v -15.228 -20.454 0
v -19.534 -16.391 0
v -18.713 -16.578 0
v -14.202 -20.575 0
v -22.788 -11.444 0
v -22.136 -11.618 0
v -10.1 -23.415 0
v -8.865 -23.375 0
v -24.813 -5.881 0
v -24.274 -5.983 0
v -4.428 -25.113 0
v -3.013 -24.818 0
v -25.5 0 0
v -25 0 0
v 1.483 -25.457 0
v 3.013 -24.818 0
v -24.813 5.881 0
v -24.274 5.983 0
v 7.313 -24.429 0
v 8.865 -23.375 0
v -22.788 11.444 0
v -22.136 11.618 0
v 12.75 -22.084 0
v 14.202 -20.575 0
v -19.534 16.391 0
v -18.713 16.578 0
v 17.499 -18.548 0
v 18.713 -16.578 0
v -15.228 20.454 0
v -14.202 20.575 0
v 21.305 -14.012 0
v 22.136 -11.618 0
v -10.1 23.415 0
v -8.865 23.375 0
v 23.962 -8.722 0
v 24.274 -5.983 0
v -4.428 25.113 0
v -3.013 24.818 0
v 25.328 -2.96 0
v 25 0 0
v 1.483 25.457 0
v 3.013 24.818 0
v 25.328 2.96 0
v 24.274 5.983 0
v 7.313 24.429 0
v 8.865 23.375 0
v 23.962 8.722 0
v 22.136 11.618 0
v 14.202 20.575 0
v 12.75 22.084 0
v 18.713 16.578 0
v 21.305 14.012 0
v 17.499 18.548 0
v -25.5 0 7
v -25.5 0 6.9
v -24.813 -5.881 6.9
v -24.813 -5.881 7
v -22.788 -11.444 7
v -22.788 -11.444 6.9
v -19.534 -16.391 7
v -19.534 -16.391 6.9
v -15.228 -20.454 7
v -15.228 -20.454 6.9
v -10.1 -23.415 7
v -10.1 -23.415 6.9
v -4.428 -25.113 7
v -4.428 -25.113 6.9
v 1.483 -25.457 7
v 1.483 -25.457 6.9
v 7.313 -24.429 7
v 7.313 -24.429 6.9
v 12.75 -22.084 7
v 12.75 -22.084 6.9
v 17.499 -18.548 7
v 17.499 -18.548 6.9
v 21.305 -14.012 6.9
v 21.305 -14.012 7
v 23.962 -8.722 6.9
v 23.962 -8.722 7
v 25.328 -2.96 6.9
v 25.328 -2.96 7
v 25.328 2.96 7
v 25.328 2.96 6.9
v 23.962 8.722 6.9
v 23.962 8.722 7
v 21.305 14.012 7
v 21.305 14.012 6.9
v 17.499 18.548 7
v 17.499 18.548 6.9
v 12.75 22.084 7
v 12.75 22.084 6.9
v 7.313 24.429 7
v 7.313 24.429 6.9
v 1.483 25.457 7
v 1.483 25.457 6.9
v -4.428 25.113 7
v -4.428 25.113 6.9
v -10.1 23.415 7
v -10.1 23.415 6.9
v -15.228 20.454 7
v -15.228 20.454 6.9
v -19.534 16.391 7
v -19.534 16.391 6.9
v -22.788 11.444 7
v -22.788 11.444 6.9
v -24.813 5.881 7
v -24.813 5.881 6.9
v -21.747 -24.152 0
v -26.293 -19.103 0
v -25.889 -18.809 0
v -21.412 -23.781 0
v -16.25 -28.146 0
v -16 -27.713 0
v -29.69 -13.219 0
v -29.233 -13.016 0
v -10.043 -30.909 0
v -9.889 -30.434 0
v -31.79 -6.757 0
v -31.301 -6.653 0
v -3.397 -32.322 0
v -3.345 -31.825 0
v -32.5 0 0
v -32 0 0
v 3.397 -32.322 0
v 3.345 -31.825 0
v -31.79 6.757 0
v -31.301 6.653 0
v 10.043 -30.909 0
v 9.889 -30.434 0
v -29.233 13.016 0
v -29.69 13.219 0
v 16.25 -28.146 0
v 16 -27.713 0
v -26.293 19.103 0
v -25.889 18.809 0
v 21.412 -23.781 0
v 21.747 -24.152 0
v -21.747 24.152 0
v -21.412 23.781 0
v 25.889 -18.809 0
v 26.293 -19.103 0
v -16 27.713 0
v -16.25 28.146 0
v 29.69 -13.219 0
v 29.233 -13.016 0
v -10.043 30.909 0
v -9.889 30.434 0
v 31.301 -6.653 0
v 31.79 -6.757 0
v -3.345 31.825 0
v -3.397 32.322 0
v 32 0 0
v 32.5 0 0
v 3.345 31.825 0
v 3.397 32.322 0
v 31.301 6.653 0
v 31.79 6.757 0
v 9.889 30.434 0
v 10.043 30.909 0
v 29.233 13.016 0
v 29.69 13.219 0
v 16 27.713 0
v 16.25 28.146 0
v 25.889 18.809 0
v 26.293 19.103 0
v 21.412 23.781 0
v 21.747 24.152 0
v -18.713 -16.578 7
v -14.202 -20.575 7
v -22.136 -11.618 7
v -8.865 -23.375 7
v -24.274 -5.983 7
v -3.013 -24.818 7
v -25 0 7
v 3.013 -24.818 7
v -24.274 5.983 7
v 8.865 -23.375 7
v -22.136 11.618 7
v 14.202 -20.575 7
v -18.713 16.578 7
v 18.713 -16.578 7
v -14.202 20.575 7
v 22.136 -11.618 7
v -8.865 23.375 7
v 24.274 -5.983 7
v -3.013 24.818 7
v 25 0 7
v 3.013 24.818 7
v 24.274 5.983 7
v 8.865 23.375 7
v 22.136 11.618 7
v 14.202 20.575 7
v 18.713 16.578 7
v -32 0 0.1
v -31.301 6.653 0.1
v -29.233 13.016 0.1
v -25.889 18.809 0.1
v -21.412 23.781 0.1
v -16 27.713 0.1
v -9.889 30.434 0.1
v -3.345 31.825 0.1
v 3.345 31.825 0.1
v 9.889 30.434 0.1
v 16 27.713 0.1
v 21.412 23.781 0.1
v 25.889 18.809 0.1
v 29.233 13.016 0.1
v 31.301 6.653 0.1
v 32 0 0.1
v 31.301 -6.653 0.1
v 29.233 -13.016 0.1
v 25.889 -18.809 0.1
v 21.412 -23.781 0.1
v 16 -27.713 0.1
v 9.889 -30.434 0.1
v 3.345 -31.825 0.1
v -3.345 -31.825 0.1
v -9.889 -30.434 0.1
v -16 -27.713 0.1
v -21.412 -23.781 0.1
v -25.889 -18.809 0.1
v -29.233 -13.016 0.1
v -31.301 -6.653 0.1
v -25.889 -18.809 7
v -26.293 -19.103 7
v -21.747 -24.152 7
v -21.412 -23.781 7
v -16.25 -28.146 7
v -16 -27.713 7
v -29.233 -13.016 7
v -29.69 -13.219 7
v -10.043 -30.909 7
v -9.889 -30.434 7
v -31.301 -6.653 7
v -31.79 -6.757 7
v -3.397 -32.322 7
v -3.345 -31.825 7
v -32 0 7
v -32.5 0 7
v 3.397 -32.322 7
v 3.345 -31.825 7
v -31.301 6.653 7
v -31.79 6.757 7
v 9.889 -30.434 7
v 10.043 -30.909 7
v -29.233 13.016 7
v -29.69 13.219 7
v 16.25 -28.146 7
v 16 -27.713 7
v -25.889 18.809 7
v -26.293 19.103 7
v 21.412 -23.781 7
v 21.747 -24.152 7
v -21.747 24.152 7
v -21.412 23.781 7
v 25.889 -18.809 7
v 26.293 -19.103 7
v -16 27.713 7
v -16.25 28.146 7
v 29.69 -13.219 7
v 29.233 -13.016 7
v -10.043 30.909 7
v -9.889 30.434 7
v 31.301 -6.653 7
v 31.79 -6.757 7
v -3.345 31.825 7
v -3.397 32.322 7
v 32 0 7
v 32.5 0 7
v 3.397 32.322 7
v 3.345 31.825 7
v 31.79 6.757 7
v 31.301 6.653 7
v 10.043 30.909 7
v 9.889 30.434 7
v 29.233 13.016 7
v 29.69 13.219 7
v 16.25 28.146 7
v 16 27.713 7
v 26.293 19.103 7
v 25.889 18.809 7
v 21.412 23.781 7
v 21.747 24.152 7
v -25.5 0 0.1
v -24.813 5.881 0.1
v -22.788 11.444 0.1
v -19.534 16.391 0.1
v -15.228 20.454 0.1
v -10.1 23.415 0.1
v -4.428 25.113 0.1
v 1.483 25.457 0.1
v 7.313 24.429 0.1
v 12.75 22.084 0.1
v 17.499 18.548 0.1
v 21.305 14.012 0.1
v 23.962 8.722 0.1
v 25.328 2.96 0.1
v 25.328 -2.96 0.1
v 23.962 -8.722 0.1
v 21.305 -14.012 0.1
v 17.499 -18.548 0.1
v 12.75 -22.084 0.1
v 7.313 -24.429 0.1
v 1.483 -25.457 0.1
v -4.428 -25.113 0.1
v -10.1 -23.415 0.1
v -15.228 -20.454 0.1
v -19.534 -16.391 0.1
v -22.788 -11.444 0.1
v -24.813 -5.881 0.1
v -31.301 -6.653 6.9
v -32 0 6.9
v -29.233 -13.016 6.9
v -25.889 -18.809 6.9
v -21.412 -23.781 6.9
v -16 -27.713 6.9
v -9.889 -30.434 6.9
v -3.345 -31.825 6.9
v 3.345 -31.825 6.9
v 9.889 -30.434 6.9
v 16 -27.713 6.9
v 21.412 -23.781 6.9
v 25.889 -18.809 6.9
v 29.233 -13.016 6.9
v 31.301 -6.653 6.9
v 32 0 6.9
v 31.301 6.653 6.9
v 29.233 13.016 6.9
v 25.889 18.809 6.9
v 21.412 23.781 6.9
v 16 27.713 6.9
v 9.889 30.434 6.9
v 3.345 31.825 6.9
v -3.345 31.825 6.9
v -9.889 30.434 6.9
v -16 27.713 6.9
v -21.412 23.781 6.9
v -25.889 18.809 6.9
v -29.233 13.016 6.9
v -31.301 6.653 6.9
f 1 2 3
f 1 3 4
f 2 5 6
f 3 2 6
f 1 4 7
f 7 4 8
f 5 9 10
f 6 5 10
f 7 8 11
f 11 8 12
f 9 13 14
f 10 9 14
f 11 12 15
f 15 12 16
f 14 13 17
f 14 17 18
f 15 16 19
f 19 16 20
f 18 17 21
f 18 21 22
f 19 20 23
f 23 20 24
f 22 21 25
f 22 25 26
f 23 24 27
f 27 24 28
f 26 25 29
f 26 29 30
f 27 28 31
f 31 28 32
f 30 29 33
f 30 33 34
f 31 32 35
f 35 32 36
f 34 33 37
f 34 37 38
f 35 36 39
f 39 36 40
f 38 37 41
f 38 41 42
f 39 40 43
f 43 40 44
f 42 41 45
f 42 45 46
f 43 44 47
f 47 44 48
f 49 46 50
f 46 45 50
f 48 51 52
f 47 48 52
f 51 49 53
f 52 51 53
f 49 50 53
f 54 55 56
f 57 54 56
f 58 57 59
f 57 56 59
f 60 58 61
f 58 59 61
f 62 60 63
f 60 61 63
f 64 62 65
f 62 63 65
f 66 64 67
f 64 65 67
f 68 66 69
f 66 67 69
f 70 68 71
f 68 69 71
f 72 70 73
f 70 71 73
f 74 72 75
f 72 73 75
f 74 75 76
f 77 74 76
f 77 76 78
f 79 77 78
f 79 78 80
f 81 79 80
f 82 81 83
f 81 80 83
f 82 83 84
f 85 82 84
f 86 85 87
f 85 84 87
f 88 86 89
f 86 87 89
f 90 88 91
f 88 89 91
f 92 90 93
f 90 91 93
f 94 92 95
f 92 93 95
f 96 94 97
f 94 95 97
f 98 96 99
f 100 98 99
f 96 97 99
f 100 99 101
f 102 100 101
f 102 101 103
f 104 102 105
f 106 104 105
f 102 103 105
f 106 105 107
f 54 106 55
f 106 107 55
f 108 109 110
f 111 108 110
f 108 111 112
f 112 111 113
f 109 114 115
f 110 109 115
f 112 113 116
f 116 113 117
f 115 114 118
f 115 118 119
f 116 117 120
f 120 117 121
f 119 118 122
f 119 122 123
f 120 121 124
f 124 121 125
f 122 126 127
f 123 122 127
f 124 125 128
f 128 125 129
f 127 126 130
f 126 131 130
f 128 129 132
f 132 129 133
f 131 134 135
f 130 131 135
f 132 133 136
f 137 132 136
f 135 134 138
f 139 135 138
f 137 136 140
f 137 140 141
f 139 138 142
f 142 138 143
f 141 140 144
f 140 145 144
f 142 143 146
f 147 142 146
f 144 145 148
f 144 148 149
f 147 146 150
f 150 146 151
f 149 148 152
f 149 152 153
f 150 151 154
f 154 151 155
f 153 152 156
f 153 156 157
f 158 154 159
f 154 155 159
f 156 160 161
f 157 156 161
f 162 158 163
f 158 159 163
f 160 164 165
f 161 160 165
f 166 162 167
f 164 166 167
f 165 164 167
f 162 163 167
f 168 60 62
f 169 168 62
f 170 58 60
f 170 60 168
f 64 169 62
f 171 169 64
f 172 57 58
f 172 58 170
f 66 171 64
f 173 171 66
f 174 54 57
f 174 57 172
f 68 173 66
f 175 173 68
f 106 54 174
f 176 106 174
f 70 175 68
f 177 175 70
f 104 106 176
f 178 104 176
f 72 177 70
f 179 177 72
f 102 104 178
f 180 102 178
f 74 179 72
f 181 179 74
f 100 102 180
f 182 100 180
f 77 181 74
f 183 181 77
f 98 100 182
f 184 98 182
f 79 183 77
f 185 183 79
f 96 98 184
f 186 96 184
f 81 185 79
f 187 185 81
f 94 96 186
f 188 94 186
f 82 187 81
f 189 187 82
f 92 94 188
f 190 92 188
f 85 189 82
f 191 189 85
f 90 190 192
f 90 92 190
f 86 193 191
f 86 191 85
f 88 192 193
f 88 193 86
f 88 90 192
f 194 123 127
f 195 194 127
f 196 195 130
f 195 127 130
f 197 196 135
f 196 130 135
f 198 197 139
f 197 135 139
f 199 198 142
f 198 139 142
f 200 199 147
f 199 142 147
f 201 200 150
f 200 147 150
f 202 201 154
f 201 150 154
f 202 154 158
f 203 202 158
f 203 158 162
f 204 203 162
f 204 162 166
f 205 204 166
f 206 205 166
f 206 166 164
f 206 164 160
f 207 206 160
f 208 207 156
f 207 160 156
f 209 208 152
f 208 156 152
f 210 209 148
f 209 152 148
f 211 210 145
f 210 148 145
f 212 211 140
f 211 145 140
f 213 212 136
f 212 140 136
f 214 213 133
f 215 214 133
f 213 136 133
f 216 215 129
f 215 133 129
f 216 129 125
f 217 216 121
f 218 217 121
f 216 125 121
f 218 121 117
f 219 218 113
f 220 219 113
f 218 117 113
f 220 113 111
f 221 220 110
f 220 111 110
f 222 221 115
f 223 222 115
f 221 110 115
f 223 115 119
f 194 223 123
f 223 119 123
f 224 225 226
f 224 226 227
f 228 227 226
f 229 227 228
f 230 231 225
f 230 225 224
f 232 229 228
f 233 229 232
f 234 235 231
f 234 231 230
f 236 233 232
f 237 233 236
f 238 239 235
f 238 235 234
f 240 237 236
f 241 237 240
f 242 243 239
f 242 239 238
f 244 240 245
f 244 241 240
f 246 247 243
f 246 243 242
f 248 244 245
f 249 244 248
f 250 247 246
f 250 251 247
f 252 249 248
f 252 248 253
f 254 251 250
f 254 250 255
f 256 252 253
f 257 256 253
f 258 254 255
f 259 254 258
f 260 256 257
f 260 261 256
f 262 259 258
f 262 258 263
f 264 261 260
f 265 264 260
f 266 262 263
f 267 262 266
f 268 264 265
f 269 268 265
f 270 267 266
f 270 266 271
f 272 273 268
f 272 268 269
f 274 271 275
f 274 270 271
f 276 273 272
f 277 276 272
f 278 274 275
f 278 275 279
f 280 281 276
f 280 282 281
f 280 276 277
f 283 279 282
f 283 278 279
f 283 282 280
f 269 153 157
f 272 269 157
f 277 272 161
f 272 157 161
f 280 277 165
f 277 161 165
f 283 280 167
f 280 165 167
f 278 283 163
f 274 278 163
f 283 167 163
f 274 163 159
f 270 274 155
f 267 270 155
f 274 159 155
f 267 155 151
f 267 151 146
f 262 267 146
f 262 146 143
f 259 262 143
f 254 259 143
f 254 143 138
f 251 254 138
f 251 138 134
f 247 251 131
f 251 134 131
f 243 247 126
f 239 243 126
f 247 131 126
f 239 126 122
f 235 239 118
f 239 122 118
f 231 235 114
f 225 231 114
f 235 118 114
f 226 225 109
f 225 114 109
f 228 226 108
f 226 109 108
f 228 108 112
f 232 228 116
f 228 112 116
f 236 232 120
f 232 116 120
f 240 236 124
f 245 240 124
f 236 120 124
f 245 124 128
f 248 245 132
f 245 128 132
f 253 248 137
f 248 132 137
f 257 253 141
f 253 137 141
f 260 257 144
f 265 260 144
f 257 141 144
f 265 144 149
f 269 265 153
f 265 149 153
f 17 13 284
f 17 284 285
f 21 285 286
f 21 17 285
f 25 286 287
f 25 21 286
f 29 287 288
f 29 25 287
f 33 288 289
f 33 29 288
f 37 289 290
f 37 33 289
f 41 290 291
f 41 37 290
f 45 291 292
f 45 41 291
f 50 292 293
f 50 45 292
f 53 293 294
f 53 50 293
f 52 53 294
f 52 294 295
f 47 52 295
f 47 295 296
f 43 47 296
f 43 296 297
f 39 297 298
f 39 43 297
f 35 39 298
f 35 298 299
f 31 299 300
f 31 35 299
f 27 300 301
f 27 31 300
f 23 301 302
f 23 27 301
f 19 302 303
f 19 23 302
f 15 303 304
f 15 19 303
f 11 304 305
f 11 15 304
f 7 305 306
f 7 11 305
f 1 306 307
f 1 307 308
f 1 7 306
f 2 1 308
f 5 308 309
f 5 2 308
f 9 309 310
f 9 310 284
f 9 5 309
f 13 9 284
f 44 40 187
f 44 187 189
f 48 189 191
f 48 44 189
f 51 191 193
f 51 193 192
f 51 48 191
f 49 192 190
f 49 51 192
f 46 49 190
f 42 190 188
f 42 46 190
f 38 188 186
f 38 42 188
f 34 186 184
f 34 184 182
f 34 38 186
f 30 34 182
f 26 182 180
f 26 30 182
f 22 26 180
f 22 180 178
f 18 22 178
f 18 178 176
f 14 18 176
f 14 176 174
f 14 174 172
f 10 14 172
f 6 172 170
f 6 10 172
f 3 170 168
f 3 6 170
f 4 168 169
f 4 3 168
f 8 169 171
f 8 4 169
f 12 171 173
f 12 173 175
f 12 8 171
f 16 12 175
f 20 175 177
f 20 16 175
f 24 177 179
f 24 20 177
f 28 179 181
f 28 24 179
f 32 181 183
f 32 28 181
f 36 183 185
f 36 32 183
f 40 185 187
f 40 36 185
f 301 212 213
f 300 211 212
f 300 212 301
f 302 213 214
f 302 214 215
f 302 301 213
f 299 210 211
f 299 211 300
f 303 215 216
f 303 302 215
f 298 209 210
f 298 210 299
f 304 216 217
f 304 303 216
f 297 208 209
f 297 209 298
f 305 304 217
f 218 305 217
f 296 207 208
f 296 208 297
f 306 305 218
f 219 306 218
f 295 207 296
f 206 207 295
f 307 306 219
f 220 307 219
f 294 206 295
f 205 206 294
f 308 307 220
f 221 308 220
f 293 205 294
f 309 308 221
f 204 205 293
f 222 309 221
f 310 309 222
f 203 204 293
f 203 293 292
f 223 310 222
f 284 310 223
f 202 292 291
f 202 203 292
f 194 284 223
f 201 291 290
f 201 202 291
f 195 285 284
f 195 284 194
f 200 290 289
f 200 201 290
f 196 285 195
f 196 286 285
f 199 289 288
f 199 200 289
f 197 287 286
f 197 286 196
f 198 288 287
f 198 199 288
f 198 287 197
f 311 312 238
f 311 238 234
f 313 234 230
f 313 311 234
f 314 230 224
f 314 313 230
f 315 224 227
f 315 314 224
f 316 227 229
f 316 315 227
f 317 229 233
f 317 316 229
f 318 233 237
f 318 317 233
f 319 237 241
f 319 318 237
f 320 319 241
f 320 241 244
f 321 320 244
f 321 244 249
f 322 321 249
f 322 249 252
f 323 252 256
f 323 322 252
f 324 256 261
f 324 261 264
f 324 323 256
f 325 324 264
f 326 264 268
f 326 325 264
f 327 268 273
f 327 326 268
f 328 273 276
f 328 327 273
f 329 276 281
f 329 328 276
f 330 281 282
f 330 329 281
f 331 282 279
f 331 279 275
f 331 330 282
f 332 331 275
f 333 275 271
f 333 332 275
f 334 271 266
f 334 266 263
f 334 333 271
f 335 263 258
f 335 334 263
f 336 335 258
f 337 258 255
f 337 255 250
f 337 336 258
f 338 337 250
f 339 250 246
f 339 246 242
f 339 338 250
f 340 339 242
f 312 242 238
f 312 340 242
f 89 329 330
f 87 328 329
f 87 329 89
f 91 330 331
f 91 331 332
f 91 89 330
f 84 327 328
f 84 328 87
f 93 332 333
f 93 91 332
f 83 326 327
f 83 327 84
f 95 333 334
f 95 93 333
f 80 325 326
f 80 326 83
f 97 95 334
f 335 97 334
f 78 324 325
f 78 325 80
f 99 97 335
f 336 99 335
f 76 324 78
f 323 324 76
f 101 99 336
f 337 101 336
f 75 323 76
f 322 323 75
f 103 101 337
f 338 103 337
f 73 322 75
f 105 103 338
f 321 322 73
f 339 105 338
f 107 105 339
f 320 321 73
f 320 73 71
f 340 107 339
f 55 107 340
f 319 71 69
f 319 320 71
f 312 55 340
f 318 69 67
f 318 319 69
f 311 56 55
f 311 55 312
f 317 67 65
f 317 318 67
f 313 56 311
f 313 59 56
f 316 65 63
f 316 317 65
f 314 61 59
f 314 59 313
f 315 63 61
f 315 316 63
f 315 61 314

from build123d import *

# Parameters (mm, degrees)
SKETCH1_R           = 32.5
SKETCH1_R_2         = 25
BOSS_EXTRUDE1_DEPTH = 7
SKETCH2_R           = 32
SKETCH2_R_2         = 25.5
CUT_EXTRUDE1_DEPTH  = 0.1
CUT_EXTRUDE2_START  = -0.1
SKETCH3_R           = 32
SKETCH3_R_2         = 25.5
CUT_EXTRUDE2_DEPTH  = 0.1


with BuildPart() as part:
    # Sketch1 → Boss-Extrude1 (new body)
    with BuildSketch(Plane.XY):
        Circle(SKETCH1_R)
        Circle(SKETCH1_R_2, mode=Mode.SUBTRACT)
    extrude(amount=BOSS_EXTRUDE1_DEPTH)

    # Sketch2 → Cut-Extrude1 (cut)
    with BuildSketch(Plane(origin=(0, 0, 0), x_dir=(-1, 0, 0), z_dir=(0, 0, -1))):
        Circle(SKETCH2_R)
        Circle(SKETCH2_R_2, mode=Mode.SUBTRACT)
    extrude(amount=-CUT_EXTRUDE1_DEPTH, mode=Mode.SUBTRACT)

    # Sketch3 → Cut-Extrude2 (cut)
    with BuildSketch(Plane.XY.offset(7).offset(CUT_EXTRUDE2_START)):
        with Locations(Location((0, 0, 0), (0, 0, 180))):
            Circle(SKETCH3_R)
        with Locations(Location((0, 0, 0), (0, 0, 180))):
            Circle(SKETCH3_R_2, mode=Mode.SUBTRACT)
    extrude(amount=CUT_EXTRUDE2_DEPTH, mode=Mode.SUBTRACT)


solid = part.part
